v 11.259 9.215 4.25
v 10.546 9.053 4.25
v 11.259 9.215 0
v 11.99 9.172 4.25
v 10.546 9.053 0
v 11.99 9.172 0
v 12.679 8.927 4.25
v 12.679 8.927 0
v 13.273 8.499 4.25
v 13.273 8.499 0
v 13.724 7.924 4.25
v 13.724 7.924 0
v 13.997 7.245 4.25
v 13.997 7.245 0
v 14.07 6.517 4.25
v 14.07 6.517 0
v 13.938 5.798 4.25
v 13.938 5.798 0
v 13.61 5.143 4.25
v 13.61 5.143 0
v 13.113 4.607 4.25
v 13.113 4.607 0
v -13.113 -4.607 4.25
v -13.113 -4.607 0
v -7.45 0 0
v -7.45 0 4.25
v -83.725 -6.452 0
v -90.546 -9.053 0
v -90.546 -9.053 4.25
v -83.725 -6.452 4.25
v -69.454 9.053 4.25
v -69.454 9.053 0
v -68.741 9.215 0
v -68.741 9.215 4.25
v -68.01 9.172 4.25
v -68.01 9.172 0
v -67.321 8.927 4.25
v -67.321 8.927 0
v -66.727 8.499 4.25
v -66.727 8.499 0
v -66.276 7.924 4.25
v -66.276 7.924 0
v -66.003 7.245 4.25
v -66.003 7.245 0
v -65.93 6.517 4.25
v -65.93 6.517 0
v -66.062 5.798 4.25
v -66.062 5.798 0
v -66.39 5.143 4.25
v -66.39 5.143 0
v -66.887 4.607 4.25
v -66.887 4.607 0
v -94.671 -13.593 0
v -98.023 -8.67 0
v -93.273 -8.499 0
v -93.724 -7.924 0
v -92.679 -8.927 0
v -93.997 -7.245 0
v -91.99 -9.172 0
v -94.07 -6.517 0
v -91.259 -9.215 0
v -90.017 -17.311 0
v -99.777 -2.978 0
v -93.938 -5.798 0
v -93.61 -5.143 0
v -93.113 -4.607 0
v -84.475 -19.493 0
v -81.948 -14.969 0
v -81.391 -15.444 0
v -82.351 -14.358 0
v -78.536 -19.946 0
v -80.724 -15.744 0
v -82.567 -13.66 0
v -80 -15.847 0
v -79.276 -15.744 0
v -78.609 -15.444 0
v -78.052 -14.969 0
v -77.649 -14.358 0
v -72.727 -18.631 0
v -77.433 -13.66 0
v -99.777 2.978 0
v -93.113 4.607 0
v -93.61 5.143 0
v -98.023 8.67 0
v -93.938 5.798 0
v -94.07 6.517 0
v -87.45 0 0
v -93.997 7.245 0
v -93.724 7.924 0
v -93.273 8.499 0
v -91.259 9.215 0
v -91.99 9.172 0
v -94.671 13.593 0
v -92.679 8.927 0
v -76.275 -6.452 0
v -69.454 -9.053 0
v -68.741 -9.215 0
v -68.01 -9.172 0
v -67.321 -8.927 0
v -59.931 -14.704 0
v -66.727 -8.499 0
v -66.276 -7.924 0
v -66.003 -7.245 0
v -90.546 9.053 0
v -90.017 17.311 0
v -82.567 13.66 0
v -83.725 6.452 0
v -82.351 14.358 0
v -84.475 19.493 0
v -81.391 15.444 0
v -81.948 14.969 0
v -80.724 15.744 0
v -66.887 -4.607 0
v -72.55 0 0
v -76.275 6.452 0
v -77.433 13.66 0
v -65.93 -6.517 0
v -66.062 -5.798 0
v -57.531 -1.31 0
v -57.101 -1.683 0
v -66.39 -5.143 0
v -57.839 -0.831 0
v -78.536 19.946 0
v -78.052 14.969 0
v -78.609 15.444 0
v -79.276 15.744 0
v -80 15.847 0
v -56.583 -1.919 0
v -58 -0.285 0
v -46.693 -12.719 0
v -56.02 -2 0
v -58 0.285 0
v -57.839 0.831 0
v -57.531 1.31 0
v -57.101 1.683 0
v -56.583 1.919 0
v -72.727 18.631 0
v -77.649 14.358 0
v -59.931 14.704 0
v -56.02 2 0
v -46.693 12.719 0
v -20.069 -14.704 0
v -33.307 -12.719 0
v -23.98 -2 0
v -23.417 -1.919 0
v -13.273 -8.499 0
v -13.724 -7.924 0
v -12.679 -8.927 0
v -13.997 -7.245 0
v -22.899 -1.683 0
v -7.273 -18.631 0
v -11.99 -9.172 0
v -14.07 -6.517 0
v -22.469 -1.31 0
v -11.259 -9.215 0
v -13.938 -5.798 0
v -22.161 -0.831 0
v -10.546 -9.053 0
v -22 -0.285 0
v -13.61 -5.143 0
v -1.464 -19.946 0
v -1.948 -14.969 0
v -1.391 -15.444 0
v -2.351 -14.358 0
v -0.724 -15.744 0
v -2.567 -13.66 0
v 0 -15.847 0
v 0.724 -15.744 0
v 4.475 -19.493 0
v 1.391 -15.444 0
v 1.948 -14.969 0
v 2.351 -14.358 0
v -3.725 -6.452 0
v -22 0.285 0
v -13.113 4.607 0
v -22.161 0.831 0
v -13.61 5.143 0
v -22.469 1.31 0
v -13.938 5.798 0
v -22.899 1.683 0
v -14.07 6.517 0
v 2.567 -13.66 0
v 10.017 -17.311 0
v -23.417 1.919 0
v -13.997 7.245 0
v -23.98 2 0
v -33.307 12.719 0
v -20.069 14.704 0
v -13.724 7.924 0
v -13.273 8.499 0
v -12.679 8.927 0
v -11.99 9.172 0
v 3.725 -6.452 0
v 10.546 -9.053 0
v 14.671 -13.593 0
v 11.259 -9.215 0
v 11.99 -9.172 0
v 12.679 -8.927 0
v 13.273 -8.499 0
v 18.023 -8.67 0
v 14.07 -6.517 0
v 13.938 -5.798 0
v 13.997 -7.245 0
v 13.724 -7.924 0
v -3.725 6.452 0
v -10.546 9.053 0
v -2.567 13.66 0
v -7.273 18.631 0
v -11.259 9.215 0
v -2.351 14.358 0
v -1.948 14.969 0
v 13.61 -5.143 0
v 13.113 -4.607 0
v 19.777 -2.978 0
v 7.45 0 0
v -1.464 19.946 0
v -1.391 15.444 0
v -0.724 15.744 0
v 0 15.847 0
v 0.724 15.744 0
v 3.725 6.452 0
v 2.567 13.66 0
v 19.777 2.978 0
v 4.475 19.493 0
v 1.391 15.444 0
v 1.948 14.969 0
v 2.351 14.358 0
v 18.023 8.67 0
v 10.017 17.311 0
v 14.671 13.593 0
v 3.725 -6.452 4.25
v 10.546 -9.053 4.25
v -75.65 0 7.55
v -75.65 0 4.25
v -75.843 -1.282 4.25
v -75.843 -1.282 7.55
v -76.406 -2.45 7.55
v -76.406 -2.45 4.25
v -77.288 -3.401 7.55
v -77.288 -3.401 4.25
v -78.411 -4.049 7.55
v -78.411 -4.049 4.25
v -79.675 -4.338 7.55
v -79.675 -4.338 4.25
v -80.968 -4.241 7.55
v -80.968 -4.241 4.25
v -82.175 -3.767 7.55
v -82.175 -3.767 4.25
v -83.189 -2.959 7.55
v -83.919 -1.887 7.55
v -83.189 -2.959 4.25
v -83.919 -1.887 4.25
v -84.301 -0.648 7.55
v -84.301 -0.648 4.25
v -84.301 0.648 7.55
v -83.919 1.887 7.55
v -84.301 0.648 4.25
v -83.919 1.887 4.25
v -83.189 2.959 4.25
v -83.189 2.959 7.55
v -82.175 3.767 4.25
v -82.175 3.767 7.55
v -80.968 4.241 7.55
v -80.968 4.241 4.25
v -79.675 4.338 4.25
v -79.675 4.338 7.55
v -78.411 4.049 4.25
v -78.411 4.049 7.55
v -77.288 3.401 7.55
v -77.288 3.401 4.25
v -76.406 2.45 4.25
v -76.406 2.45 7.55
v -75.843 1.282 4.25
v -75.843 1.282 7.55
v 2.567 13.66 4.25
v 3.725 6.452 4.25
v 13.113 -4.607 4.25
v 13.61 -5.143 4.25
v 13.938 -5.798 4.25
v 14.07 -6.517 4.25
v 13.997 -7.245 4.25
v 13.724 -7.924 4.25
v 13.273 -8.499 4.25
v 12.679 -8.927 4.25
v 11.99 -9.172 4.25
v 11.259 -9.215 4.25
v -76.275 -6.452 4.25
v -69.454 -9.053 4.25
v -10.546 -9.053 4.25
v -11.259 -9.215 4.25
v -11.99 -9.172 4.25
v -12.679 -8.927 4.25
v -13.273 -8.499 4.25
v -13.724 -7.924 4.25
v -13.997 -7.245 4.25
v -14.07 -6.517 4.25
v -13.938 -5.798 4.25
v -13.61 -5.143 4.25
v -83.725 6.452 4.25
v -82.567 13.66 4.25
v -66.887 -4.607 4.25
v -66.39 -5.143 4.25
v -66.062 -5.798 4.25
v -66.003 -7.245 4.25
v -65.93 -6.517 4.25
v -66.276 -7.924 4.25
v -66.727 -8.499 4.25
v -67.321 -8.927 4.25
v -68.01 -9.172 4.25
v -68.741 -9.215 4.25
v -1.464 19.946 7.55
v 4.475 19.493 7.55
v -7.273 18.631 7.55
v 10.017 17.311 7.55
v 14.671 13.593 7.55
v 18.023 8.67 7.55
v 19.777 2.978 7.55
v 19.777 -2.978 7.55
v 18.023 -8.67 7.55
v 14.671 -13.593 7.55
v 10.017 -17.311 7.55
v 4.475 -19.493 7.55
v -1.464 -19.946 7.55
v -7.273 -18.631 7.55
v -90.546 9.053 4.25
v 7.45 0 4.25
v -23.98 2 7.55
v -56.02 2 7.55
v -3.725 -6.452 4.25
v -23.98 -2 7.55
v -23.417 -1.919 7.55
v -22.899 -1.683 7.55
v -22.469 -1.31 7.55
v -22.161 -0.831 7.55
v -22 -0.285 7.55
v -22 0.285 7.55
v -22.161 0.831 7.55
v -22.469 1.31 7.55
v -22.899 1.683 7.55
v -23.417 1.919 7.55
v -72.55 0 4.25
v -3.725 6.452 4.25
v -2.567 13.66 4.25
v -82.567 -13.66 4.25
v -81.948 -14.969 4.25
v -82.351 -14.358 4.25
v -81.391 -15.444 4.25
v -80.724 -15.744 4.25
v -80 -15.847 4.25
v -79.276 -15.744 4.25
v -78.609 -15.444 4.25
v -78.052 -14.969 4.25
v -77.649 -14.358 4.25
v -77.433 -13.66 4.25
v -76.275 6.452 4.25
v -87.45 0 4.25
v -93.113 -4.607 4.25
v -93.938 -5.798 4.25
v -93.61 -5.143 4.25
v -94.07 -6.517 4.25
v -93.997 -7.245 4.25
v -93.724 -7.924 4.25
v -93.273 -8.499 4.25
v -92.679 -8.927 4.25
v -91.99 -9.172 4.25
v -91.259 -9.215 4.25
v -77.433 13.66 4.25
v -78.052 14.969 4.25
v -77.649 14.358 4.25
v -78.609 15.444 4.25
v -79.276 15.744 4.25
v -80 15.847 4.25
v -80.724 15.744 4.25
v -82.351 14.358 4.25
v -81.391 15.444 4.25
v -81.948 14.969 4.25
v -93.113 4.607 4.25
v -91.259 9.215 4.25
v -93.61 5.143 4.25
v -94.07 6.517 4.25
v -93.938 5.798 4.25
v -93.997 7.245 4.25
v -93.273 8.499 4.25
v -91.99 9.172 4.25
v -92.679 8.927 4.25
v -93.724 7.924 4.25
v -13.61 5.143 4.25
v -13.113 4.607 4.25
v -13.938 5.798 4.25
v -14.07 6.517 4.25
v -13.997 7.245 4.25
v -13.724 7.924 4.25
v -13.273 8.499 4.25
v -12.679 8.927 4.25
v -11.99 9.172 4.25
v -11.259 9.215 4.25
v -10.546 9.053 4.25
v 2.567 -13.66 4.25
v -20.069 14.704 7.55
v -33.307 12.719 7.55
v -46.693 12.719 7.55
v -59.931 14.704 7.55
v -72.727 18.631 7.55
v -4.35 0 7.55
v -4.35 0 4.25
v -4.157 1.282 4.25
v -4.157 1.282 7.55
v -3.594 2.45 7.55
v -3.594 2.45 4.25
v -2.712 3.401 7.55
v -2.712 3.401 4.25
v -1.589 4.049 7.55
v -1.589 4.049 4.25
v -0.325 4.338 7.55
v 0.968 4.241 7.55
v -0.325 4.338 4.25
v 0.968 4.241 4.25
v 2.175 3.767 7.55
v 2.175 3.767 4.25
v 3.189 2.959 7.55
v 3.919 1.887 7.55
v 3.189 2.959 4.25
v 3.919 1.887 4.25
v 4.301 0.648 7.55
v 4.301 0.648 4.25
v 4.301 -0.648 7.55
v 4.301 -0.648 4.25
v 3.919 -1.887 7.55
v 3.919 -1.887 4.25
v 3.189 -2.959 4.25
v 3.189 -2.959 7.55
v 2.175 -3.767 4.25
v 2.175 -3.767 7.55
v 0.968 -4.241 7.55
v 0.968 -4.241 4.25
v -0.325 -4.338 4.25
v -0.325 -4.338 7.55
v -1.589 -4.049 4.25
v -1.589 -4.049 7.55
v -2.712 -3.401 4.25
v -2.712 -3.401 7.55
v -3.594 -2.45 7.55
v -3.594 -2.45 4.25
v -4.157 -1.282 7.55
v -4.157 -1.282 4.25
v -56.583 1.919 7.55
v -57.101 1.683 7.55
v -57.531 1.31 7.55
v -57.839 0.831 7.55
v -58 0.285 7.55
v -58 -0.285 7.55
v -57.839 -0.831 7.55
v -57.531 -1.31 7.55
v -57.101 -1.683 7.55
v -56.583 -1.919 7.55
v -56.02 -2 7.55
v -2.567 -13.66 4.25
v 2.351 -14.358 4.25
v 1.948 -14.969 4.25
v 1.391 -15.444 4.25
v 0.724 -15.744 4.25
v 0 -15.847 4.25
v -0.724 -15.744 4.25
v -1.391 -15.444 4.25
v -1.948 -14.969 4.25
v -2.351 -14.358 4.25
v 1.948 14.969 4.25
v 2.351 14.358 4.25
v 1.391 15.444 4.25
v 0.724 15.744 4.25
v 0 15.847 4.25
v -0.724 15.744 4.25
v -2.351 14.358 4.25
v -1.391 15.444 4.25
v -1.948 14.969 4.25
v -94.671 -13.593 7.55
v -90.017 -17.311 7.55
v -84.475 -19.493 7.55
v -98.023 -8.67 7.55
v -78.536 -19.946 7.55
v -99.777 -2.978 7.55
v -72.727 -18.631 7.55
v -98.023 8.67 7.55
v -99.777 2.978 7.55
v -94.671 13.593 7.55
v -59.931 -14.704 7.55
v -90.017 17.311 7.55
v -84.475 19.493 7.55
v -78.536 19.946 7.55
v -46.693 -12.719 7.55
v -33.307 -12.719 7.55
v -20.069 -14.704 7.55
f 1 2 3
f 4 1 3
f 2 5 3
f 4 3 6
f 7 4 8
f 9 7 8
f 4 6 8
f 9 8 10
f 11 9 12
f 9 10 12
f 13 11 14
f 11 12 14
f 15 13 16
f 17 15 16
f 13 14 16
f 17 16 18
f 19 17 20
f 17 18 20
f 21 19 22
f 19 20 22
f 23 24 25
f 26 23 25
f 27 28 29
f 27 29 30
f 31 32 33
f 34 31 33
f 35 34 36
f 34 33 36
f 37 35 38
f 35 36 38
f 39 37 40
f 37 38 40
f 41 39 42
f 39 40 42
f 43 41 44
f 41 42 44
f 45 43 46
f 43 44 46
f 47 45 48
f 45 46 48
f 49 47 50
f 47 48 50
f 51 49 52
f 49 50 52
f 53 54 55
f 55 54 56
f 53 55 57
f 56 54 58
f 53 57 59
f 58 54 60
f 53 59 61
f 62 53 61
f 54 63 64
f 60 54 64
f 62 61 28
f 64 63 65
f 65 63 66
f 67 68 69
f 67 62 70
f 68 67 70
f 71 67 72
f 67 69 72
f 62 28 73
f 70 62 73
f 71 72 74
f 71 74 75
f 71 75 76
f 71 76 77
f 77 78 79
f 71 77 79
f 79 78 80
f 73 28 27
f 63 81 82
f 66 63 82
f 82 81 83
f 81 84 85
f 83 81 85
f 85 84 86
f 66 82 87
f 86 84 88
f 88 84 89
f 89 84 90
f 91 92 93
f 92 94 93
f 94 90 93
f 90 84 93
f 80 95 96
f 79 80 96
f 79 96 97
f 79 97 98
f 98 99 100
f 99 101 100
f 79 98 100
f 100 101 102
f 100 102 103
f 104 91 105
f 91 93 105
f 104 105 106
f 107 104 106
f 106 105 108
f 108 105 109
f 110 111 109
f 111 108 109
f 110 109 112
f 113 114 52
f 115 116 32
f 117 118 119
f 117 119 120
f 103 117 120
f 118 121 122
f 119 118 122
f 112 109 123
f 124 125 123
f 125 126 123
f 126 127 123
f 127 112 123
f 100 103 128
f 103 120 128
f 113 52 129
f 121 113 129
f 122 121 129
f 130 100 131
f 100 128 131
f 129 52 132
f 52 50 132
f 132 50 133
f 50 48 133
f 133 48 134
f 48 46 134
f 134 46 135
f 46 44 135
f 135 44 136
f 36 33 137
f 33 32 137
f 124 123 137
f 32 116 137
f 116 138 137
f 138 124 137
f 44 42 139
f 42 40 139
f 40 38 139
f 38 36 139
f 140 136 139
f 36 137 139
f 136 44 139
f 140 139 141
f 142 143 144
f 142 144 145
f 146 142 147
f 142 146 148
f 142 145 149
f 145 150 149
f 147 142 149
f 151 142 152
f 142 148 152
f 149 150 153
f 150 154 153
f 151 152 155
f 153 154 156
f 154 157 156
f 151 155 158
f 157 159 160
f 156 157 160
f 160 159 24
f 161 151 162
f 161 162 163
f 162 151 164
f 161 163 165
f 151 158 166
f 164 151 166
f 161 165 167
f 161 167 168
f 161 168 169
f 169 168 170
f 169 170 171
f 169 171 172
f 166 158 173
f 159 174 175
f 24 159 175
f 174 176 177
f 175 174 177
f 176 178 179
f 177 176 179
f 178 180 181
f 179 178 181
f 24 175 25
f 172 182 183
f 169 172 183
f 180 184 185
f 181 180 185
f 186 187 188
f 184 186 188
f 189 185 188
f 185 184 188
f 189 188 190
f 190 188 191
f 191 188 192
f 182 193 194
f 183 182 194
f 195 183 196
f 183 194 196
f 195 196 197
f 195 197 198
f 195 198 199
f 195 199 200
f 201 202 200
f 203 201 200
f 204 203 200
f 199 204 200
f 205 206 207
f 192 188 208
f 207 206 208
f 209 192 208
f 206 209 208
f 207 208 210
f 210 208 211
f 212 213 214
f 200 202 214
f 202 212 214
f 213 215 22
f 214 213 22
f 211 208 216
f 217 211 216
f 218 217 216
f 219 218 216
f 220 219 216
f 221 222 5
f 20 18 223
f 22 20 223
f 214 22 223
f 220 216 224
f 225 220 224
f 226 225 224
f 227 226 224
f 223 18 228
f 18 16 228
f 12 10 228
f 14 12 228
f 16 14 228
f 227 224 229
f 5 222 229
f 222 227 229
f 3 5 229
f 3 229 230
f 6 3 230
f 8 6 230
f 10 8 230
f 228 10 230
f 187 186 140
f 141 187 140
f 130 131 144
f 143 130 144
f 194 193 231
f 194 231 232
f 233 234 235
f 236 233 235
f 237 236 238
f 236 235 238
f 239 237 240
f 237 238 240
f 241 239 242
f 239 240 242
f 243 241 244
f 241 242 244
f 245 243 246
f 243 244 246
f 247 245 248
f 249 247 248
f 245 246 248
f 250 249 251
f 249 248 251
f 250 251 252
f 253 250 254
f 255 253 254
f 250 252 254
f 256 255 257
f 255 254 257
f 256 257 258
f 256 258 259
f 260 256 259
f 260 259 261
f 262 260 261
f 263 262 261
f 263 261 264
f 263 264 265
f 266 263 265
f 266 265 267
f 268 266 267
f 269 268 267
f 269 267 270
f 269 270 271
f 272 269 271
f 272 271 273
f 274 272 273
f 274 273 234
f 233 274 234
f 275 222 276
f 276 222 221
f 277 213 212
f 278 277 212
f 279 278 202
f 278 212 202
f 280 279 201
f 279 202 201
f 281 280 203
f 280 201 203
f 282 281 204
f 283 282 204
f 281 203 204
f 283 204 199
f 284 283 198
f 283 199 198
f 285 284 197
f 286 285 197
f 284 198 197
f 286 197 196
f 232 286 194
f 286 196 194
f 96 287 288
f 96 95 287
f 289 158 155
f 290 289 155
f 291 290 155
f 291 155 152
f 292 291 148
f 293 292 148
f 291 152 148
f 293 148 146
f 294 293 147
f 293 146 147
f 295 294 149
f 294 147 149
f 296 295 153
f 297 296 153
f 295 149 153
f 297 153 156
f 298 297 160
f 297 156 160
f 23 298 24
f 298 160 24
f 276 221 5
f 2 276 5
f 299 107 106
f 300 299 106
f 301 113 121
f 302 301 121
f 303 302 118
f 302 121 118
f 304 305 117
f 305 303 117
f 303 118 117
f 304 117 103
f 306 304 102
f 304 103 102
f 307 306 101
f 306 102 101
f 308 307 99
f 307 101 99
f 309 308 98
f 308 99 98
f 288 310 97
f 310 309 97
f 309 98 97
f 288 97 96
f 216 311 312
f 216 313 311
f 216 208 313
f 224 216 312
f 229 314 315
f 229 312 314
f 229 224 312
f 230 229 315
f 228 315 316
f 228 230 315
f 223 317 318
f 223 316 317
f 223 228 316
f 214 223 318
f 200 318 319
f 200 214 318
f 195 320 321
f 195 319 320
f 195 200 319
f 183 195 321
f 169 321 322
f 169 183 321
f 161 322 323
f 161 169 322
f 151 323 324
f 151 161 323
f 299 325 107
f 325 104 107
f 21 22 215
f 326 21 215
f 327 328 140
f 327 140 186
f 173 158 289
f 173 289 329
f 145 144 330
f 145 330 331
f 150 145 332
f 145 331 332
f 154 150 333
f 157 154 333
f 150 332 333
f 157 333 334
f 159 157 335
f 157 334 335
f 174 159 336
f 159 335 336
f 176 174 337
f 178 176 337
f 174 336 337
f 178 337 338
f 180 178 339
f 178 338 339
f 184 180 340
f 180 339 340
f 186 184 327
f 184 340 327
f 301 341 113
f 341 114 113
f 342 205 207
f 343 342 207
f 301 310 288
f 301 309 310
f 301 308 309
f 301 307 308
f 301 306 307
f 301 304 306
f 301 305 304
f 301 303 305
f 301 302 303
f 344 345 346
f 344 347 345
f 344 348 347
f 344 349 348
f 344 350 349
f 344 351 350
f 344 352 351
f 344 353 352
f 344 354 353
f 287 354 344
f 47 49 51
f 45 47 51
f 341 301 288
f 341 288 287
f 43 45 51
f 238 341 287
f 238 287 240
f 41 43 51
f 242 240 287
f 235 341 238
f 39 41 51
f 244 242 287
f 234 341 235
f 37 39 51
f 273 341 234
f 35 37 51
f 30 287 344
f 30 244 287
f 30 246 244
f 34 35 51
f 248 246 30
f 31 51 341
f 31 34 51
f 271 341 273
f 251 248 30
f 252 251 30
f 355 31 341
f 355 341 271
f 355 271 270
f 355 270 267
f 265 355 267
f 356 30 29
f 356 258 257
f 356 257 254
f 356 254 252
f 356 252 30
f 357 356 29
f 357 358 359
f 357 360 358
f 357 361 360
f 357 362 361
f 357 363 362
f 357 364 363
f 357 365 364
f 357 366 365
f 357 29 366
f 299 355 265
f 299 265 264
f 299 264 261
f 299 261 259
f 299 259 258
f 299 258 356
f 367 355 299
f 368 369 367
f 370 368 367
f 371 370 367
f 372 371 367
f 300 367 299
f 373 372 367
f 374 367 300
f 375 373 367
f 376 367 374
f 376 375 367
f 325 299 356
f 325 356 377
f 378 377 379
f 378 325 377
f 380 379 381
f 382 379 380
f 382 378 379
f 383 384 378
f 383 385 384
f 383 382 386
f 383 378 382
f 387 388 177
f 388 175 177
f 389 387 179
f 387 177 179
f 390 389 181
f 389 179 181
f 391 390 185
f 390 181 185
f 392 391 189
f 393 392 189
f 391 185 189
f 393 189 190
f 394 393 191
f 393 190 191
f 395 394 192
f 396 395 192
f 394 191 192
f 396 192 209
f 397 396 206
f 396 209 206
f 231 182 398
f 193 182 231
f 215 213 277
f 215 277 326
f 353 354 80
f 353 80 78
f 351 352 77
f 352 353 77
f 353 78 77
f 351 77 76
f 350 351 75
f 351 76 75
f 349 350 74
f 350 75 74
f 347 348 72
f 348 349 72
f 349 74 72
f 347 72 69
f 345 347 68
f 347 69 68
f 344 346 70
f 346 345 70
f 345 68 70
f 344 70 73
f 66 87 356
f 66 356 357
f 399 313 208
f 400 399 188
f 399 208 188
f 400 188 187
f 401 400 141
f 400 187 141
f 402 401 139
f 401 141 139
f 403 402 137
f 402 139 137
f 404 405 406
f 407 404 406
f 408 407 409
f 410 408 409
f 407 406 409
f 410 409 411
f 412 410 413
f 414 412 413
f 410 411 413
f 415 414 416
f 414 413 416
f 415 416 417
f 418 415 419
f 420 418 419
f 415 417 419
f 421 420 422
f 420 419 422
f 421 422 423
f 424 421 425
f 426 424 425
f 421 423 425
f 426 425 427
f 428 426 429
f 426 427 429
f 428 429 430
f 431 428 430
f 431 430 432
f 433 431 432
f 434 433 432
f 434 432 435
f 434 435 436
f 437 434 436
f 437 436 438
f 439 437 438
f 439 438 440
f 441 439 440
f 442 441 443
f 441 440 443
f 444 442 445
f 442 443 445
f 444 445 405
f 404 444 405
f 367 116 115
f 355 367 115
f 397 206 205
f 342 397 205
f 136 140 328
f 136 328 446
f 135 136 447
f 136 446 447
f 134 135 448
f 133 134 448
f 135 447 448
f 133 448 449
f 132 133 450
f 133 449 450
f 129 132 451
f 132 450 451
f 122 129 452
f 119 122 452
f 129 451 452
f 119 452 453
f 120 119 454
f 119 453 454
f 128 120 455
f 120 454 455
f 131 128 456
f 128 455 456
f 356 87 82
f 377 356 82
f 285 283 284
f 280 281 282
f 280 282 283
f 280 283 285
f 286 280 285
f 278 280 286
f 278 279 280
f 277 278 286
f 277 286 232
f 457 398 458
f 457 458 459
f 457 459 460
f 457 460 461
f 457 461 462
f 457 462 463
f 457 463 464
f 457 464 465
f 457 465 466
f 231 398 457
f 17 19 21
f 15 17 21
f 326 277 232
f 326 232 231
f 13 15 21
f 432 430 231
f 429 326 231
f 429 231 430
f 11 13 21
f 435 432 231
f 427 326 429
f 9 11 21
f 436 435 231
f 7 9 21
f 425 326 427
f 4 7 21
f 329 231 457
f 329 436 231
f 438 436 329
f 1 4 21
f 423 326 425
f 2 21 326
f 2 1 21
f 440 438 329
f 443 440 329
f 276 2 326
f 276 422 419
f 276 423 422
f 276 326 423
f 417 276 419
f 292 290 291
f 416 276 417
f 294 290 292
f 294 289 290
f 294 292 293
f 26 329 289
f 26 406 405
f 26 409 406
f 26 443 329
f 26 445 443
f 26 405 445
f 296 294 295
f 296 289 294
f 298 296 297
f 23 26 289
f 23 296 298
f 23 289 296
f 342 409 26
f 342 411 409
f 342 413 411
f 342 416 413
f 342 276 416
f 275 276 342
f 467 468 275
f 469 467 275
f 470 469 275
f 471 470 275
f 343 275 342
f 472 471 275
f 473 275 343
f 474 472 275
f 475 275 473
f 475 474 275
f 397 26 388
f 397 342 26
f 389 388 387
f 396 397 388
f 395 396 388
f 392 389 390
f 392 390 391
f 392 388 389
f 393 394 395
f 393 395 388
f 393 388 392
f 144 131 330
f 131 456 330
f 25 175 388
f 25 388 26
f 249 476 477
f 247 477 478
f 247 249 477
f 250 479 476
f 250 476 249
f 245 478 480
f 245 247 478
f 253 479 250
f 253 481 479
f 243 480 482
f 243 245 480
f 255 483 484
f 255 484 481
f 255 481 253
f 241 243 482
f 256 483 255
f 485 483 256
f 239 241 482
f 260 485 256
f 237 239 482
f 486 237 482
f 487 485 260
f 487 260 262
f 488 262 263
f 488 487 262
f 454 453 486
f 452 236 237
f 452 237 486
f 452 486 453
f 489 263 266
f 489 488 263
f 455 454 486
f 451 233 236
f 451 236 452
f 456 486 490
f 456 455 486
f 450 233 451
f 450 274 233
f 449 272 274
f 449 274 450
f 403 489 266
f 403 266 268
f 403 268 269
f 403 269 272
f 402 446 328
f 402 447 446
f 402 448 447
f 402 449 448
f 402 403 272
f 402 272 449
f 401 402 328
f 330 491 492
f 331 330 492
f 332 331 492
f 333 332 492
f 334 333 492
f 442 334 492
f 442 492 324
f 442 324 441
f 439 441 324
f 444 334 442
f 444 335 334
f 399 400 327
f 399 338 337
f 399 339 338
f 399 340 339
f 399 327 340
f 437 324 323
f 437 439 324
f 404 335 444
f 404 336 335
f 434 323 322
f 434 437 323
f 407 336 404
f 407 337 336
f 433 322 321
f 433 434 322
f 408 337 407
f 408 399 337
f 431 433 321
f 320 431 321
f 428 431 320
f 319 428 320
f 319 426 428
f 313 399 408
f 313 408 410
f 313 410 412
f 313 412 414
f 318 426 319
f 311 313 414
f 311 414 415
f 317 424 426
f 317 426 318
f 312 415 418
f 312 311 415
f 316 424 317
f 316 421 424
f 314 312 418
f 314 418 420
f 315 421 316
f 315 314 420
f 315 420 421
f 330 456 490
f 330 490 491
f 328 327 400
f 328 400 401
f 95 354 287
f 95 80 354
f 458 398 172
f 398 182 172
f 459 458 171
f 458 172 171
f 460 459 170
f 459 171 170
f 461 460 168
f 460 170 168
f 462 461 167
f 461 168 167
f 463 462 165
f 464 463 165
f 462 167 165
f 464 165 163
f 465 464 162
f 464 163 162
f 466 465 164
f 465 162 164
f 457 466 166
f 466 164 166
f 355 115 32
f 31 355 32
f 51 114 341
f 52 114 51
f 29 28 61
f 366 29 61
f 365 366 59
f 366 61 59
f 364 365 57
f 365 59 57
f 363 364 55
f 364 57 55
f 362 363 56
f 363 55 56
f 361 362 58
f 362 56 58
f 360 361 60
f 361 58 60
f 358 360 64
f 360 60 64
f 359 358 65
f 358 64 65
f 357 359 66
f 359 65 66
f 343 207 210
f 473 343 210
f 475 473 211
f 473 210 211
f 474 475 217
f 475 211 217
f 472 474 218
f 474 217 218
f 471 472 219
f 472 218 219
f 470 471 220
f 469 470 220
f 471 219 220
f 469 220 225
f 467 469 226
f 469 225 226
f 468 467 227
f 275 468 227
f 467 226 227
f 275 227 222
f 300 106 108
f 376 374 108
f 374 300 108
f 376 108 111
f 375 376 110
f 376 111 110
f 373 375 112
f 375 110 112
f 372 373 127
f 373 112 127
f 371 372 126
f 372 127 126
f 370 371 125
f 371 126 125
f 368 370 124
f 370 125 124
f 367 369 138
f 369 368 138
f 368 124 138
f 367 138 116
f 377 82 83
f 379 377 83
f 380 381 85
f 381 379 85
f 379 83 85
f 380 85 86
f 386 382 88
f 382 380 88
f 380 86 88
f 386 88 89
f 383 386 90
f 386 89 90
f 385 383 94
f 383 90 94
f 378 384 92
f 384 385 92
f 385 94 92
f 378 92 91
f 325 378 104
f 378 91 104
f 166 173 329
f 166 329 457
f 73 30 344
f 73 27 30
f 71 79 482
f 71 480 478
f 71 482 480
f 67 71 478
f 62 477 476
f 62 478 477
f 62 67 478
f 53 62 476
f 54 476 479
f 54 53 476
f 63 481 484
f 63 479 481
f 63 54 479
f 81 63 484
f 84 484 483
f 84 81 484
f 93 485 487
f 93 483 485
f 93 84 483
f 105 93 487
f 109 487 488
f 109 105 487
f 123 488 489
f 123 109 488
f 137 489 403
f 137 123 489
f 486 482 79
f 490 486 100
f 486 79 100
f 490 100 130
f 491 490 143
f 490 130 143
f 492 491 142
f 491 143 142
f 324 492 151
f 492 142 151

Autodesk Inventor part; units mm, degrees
ref_plane "YZ Plane" through (0, 0, 0) normal (1, 0, 0) x (0, 1, 0)
ref_plane "XZ Plane" through (0, 0, 0) normal (0, 1, 0) x (-1, 0, 0)
sketch "Sketch1" plane through (0, 0, 0) normal (0, 0, 1) x (1, 0, 0)
  arc A0 (-72.7273, 18.6308) -> (-72.7273, -18.6308) centre (-80, 0) ccw
  arc A1 (-7.2727, -18.6308) -> (-72.7273, -18.6308) centre (-40, -102.4695) ccw
  arc A2 (-7.2727, -18.6308) -> (-7.2727, 18.6308) centre (0, 0) ccw
  arc A3 (-72.7273, 18.6308) -> (-7.2727, 18.6308) centre (-40, 102.4695) ccw
  arc A4 (-79.5765, 3.9775) -> (-79.5765, -3.9775) centre (-80, 0) ccw
  arc A5 (-0.4235, -3.9775) -> (-0.4235, 3.9775) centre (0, 0) ccw
  arc A6 (-80.4235, -3.9775) -> (-80.4235, 3.9775) centre (-80, 0) ccw
  arc A7 (-0.4235, 3.9775) -> (-0.4235, -3.9775) centre (0, 0) ccw
  point P0 (-103.8261, -115.9088)
  dimension "d0" = 20
  dimension "d1" = 20
  dimension "d2" = 90
  dimension "d3" = 90
  dimension "d4" = 4
  dimension "d7" = 80
  dimension "d33" = 4
extrude "Extrusion1" add sketch "Sketch1" along normal blind 7.55 contours A3 A2 A1 A0 | A6 A4 | A7 A5
sketch "Sketch3" plane through (0, 0, 7.55) normal (0, 0, 1) x (1, 0, 0)
  arc A0 (-72.7273, 18.6308) -> (-72.7273, -18.6308) centre (-80, 0) ccw projected
  arc A1 (-7.2727, -18.6308) -> (-72.7273, -18.6308) centre (-40, -102.4695) ccw projected
  arc A2 (-7.2727, -18.6308) -> (-7.2727, 18.6308) centre (0, 0) ccw projected
  arc A3 (-72.7273, 18.6308) -> (-7.2727, 18.6308) centre (-40, 102.4695) ccw projected
  line L0 (-56.02, 2) -> (-23.98, 2)
  line L1 (-56.02, -2) -> (-23.98, -2)
  arc A4 (-56.02, 2) -> (-56.02, -2) centre (-56.02, 0) ccw
  arc A5 (-23.98, -2) -> (-23.98, 2) centre (-23.98, 0) ccw
  point P0 (-83.48, 0)
  dimension "d12" = 2
extrude "Extrusion2" cut sketch "Sketch3" against normal blind 10 contours L0 A5 L1 A4
ref_plane "Work Plane2" through (-40, 0, 7.55) normal (-1, 0, 0) x (0, -1, 0)
ref_plane "Work Plane1" through (-100, 0, 7.55) normal (-1, 0, 0) x (0, -1, 0)
sketch "Sketch10" plane through (0, 0, 0) normal (0, 0, -1) x (-1, 0, 0)
  circle A0 centre (0, 0) radius 4.35
  dimension "d43" = 8.7
extrude "Extrusion7" cut sketch "Sketch10" against normal blind 10
mirror "Mirror4" about plane through (-40, 0, 7.55) normal (-1, 0, 0) of "Extrusion7"
sketch "Sketch9" plane through (0, 0, 0) normal (0, 0, -1) x (-1, 0, 0)
  arc A0 (13.113, 4.6066) -> (10.5459, 9.0529) centre (11.4723, 6.6235) ccw
  arc A1 (2.5671, 13.6595) -> (-2.5671, 13.6595) centre (0, 13.2471) ccw
  line L0 (13.113, 4.6066) -> (7.45, 0)
  line L1 (10.5459, 9.0529) -> (3.725, 6.4519)
  line L2 (3.725, 6.4519) -> (2.5671, 13.6595)
  line L3 (-2.5671, 13.6595) -> (-3.725, 6.4519)
  line L4 (-3.725, 6.4519) -> (-10.5459, 9.0529)
  line L5 (-13.113, 4.6066) -> (-7.45, 0)
  arc A2 (-10.5459, 9.0529) -> (-13.113, 4.6066) centre (-11.4723, 6.6235) ccw
  arc A3 (72.7273, -18.6308) -> (72.7273, 18.6308) centre (80, 0) ccw projected
  arc A4 (7.2727, 18.6308) -> (72.7273, 18.6308) centre (40, 102.4695) ccw projected
  arc A5 (7.2727, 18.6308) -> (7.2727, -18.6308) centre (0, 0) ccw projected
  arc A6 (72.7273, -18.6308) -> (7.2727, -18.6308) centre (40, -102.4695) ccw projected
  circle A7 centre (0, 0) radius 7.45 construction
  line L6 (-7.45, 0) -> (7.45, 0) construction
  arc A8 (10.5459, -9.0529) -> (13.113, -4.6066) centre (11.4723, -6.6235) ccw
  arc A9 (-2.5671, -13.6595) -> (2.5671, -13.6595) centre (0, -13.2471) ccw
  line L7 (13.113, -4.6066) -> (7.45, 0)
  line L8 (10.5459, -9.0529) -> (3.725, -6.4519)
  line L9 (3.725, -6.4519) -> (2.5671, -13.6595)
  line L10 (-2.5671, -13.6595) -> (-3.725, -6.4519)
  line L11 (-3.725, -6.4519) -> (-10.5459, -9.0529)
  line L12 (-13.113, -4.6066) -> (-7.45, 0)
  arc A10 (-13.113, -4.6066) -> (-10.5459, -9.0529) centre (-11.4723, -6.6235) ccw
  circle A11 centre (0, 0) radius 4.35
  dimension "diametro_petalo" = 2.6
  dimension "diametro_aspa" = 14.9
  dimension "largo_petalo" = 7.3
  dimension "d52" = 60
  dimension "d53" = 8.7
extrude "Extrusion8" cut sketch "Sketch9" against normal blind 4.25 contours L0 L7 A8 L8 L9 A9 L10 L11 A10 L12 L5 A2 L4 L3 A1 L2 L1 A0
mirror "Mirror5" about plane through (-40, 0, 7.55) normal (-1, 0, 0) of "Extrusion8"
equation "\"d0\" = radio_muslo"
equation "\"d1\" = d0"
equation "\"d2\" = curva"
equation "\"d3\" = d2"
equation "\"d4\" = 0.5 * diametro_servo"
equation "\"d7\" = distancia_centros"
equation "\"d33\" = d4"
equation "\"curva\" = 90"
equation "\"distancia_centros\" = 80"
equation "\"espesor\" = 3.3"
equation "\"diametro_servo\" = 8"
equation "\"radio_muslo\" = 20"
properties part number "Pata - Antebrazo" material "ABS Plastic"
